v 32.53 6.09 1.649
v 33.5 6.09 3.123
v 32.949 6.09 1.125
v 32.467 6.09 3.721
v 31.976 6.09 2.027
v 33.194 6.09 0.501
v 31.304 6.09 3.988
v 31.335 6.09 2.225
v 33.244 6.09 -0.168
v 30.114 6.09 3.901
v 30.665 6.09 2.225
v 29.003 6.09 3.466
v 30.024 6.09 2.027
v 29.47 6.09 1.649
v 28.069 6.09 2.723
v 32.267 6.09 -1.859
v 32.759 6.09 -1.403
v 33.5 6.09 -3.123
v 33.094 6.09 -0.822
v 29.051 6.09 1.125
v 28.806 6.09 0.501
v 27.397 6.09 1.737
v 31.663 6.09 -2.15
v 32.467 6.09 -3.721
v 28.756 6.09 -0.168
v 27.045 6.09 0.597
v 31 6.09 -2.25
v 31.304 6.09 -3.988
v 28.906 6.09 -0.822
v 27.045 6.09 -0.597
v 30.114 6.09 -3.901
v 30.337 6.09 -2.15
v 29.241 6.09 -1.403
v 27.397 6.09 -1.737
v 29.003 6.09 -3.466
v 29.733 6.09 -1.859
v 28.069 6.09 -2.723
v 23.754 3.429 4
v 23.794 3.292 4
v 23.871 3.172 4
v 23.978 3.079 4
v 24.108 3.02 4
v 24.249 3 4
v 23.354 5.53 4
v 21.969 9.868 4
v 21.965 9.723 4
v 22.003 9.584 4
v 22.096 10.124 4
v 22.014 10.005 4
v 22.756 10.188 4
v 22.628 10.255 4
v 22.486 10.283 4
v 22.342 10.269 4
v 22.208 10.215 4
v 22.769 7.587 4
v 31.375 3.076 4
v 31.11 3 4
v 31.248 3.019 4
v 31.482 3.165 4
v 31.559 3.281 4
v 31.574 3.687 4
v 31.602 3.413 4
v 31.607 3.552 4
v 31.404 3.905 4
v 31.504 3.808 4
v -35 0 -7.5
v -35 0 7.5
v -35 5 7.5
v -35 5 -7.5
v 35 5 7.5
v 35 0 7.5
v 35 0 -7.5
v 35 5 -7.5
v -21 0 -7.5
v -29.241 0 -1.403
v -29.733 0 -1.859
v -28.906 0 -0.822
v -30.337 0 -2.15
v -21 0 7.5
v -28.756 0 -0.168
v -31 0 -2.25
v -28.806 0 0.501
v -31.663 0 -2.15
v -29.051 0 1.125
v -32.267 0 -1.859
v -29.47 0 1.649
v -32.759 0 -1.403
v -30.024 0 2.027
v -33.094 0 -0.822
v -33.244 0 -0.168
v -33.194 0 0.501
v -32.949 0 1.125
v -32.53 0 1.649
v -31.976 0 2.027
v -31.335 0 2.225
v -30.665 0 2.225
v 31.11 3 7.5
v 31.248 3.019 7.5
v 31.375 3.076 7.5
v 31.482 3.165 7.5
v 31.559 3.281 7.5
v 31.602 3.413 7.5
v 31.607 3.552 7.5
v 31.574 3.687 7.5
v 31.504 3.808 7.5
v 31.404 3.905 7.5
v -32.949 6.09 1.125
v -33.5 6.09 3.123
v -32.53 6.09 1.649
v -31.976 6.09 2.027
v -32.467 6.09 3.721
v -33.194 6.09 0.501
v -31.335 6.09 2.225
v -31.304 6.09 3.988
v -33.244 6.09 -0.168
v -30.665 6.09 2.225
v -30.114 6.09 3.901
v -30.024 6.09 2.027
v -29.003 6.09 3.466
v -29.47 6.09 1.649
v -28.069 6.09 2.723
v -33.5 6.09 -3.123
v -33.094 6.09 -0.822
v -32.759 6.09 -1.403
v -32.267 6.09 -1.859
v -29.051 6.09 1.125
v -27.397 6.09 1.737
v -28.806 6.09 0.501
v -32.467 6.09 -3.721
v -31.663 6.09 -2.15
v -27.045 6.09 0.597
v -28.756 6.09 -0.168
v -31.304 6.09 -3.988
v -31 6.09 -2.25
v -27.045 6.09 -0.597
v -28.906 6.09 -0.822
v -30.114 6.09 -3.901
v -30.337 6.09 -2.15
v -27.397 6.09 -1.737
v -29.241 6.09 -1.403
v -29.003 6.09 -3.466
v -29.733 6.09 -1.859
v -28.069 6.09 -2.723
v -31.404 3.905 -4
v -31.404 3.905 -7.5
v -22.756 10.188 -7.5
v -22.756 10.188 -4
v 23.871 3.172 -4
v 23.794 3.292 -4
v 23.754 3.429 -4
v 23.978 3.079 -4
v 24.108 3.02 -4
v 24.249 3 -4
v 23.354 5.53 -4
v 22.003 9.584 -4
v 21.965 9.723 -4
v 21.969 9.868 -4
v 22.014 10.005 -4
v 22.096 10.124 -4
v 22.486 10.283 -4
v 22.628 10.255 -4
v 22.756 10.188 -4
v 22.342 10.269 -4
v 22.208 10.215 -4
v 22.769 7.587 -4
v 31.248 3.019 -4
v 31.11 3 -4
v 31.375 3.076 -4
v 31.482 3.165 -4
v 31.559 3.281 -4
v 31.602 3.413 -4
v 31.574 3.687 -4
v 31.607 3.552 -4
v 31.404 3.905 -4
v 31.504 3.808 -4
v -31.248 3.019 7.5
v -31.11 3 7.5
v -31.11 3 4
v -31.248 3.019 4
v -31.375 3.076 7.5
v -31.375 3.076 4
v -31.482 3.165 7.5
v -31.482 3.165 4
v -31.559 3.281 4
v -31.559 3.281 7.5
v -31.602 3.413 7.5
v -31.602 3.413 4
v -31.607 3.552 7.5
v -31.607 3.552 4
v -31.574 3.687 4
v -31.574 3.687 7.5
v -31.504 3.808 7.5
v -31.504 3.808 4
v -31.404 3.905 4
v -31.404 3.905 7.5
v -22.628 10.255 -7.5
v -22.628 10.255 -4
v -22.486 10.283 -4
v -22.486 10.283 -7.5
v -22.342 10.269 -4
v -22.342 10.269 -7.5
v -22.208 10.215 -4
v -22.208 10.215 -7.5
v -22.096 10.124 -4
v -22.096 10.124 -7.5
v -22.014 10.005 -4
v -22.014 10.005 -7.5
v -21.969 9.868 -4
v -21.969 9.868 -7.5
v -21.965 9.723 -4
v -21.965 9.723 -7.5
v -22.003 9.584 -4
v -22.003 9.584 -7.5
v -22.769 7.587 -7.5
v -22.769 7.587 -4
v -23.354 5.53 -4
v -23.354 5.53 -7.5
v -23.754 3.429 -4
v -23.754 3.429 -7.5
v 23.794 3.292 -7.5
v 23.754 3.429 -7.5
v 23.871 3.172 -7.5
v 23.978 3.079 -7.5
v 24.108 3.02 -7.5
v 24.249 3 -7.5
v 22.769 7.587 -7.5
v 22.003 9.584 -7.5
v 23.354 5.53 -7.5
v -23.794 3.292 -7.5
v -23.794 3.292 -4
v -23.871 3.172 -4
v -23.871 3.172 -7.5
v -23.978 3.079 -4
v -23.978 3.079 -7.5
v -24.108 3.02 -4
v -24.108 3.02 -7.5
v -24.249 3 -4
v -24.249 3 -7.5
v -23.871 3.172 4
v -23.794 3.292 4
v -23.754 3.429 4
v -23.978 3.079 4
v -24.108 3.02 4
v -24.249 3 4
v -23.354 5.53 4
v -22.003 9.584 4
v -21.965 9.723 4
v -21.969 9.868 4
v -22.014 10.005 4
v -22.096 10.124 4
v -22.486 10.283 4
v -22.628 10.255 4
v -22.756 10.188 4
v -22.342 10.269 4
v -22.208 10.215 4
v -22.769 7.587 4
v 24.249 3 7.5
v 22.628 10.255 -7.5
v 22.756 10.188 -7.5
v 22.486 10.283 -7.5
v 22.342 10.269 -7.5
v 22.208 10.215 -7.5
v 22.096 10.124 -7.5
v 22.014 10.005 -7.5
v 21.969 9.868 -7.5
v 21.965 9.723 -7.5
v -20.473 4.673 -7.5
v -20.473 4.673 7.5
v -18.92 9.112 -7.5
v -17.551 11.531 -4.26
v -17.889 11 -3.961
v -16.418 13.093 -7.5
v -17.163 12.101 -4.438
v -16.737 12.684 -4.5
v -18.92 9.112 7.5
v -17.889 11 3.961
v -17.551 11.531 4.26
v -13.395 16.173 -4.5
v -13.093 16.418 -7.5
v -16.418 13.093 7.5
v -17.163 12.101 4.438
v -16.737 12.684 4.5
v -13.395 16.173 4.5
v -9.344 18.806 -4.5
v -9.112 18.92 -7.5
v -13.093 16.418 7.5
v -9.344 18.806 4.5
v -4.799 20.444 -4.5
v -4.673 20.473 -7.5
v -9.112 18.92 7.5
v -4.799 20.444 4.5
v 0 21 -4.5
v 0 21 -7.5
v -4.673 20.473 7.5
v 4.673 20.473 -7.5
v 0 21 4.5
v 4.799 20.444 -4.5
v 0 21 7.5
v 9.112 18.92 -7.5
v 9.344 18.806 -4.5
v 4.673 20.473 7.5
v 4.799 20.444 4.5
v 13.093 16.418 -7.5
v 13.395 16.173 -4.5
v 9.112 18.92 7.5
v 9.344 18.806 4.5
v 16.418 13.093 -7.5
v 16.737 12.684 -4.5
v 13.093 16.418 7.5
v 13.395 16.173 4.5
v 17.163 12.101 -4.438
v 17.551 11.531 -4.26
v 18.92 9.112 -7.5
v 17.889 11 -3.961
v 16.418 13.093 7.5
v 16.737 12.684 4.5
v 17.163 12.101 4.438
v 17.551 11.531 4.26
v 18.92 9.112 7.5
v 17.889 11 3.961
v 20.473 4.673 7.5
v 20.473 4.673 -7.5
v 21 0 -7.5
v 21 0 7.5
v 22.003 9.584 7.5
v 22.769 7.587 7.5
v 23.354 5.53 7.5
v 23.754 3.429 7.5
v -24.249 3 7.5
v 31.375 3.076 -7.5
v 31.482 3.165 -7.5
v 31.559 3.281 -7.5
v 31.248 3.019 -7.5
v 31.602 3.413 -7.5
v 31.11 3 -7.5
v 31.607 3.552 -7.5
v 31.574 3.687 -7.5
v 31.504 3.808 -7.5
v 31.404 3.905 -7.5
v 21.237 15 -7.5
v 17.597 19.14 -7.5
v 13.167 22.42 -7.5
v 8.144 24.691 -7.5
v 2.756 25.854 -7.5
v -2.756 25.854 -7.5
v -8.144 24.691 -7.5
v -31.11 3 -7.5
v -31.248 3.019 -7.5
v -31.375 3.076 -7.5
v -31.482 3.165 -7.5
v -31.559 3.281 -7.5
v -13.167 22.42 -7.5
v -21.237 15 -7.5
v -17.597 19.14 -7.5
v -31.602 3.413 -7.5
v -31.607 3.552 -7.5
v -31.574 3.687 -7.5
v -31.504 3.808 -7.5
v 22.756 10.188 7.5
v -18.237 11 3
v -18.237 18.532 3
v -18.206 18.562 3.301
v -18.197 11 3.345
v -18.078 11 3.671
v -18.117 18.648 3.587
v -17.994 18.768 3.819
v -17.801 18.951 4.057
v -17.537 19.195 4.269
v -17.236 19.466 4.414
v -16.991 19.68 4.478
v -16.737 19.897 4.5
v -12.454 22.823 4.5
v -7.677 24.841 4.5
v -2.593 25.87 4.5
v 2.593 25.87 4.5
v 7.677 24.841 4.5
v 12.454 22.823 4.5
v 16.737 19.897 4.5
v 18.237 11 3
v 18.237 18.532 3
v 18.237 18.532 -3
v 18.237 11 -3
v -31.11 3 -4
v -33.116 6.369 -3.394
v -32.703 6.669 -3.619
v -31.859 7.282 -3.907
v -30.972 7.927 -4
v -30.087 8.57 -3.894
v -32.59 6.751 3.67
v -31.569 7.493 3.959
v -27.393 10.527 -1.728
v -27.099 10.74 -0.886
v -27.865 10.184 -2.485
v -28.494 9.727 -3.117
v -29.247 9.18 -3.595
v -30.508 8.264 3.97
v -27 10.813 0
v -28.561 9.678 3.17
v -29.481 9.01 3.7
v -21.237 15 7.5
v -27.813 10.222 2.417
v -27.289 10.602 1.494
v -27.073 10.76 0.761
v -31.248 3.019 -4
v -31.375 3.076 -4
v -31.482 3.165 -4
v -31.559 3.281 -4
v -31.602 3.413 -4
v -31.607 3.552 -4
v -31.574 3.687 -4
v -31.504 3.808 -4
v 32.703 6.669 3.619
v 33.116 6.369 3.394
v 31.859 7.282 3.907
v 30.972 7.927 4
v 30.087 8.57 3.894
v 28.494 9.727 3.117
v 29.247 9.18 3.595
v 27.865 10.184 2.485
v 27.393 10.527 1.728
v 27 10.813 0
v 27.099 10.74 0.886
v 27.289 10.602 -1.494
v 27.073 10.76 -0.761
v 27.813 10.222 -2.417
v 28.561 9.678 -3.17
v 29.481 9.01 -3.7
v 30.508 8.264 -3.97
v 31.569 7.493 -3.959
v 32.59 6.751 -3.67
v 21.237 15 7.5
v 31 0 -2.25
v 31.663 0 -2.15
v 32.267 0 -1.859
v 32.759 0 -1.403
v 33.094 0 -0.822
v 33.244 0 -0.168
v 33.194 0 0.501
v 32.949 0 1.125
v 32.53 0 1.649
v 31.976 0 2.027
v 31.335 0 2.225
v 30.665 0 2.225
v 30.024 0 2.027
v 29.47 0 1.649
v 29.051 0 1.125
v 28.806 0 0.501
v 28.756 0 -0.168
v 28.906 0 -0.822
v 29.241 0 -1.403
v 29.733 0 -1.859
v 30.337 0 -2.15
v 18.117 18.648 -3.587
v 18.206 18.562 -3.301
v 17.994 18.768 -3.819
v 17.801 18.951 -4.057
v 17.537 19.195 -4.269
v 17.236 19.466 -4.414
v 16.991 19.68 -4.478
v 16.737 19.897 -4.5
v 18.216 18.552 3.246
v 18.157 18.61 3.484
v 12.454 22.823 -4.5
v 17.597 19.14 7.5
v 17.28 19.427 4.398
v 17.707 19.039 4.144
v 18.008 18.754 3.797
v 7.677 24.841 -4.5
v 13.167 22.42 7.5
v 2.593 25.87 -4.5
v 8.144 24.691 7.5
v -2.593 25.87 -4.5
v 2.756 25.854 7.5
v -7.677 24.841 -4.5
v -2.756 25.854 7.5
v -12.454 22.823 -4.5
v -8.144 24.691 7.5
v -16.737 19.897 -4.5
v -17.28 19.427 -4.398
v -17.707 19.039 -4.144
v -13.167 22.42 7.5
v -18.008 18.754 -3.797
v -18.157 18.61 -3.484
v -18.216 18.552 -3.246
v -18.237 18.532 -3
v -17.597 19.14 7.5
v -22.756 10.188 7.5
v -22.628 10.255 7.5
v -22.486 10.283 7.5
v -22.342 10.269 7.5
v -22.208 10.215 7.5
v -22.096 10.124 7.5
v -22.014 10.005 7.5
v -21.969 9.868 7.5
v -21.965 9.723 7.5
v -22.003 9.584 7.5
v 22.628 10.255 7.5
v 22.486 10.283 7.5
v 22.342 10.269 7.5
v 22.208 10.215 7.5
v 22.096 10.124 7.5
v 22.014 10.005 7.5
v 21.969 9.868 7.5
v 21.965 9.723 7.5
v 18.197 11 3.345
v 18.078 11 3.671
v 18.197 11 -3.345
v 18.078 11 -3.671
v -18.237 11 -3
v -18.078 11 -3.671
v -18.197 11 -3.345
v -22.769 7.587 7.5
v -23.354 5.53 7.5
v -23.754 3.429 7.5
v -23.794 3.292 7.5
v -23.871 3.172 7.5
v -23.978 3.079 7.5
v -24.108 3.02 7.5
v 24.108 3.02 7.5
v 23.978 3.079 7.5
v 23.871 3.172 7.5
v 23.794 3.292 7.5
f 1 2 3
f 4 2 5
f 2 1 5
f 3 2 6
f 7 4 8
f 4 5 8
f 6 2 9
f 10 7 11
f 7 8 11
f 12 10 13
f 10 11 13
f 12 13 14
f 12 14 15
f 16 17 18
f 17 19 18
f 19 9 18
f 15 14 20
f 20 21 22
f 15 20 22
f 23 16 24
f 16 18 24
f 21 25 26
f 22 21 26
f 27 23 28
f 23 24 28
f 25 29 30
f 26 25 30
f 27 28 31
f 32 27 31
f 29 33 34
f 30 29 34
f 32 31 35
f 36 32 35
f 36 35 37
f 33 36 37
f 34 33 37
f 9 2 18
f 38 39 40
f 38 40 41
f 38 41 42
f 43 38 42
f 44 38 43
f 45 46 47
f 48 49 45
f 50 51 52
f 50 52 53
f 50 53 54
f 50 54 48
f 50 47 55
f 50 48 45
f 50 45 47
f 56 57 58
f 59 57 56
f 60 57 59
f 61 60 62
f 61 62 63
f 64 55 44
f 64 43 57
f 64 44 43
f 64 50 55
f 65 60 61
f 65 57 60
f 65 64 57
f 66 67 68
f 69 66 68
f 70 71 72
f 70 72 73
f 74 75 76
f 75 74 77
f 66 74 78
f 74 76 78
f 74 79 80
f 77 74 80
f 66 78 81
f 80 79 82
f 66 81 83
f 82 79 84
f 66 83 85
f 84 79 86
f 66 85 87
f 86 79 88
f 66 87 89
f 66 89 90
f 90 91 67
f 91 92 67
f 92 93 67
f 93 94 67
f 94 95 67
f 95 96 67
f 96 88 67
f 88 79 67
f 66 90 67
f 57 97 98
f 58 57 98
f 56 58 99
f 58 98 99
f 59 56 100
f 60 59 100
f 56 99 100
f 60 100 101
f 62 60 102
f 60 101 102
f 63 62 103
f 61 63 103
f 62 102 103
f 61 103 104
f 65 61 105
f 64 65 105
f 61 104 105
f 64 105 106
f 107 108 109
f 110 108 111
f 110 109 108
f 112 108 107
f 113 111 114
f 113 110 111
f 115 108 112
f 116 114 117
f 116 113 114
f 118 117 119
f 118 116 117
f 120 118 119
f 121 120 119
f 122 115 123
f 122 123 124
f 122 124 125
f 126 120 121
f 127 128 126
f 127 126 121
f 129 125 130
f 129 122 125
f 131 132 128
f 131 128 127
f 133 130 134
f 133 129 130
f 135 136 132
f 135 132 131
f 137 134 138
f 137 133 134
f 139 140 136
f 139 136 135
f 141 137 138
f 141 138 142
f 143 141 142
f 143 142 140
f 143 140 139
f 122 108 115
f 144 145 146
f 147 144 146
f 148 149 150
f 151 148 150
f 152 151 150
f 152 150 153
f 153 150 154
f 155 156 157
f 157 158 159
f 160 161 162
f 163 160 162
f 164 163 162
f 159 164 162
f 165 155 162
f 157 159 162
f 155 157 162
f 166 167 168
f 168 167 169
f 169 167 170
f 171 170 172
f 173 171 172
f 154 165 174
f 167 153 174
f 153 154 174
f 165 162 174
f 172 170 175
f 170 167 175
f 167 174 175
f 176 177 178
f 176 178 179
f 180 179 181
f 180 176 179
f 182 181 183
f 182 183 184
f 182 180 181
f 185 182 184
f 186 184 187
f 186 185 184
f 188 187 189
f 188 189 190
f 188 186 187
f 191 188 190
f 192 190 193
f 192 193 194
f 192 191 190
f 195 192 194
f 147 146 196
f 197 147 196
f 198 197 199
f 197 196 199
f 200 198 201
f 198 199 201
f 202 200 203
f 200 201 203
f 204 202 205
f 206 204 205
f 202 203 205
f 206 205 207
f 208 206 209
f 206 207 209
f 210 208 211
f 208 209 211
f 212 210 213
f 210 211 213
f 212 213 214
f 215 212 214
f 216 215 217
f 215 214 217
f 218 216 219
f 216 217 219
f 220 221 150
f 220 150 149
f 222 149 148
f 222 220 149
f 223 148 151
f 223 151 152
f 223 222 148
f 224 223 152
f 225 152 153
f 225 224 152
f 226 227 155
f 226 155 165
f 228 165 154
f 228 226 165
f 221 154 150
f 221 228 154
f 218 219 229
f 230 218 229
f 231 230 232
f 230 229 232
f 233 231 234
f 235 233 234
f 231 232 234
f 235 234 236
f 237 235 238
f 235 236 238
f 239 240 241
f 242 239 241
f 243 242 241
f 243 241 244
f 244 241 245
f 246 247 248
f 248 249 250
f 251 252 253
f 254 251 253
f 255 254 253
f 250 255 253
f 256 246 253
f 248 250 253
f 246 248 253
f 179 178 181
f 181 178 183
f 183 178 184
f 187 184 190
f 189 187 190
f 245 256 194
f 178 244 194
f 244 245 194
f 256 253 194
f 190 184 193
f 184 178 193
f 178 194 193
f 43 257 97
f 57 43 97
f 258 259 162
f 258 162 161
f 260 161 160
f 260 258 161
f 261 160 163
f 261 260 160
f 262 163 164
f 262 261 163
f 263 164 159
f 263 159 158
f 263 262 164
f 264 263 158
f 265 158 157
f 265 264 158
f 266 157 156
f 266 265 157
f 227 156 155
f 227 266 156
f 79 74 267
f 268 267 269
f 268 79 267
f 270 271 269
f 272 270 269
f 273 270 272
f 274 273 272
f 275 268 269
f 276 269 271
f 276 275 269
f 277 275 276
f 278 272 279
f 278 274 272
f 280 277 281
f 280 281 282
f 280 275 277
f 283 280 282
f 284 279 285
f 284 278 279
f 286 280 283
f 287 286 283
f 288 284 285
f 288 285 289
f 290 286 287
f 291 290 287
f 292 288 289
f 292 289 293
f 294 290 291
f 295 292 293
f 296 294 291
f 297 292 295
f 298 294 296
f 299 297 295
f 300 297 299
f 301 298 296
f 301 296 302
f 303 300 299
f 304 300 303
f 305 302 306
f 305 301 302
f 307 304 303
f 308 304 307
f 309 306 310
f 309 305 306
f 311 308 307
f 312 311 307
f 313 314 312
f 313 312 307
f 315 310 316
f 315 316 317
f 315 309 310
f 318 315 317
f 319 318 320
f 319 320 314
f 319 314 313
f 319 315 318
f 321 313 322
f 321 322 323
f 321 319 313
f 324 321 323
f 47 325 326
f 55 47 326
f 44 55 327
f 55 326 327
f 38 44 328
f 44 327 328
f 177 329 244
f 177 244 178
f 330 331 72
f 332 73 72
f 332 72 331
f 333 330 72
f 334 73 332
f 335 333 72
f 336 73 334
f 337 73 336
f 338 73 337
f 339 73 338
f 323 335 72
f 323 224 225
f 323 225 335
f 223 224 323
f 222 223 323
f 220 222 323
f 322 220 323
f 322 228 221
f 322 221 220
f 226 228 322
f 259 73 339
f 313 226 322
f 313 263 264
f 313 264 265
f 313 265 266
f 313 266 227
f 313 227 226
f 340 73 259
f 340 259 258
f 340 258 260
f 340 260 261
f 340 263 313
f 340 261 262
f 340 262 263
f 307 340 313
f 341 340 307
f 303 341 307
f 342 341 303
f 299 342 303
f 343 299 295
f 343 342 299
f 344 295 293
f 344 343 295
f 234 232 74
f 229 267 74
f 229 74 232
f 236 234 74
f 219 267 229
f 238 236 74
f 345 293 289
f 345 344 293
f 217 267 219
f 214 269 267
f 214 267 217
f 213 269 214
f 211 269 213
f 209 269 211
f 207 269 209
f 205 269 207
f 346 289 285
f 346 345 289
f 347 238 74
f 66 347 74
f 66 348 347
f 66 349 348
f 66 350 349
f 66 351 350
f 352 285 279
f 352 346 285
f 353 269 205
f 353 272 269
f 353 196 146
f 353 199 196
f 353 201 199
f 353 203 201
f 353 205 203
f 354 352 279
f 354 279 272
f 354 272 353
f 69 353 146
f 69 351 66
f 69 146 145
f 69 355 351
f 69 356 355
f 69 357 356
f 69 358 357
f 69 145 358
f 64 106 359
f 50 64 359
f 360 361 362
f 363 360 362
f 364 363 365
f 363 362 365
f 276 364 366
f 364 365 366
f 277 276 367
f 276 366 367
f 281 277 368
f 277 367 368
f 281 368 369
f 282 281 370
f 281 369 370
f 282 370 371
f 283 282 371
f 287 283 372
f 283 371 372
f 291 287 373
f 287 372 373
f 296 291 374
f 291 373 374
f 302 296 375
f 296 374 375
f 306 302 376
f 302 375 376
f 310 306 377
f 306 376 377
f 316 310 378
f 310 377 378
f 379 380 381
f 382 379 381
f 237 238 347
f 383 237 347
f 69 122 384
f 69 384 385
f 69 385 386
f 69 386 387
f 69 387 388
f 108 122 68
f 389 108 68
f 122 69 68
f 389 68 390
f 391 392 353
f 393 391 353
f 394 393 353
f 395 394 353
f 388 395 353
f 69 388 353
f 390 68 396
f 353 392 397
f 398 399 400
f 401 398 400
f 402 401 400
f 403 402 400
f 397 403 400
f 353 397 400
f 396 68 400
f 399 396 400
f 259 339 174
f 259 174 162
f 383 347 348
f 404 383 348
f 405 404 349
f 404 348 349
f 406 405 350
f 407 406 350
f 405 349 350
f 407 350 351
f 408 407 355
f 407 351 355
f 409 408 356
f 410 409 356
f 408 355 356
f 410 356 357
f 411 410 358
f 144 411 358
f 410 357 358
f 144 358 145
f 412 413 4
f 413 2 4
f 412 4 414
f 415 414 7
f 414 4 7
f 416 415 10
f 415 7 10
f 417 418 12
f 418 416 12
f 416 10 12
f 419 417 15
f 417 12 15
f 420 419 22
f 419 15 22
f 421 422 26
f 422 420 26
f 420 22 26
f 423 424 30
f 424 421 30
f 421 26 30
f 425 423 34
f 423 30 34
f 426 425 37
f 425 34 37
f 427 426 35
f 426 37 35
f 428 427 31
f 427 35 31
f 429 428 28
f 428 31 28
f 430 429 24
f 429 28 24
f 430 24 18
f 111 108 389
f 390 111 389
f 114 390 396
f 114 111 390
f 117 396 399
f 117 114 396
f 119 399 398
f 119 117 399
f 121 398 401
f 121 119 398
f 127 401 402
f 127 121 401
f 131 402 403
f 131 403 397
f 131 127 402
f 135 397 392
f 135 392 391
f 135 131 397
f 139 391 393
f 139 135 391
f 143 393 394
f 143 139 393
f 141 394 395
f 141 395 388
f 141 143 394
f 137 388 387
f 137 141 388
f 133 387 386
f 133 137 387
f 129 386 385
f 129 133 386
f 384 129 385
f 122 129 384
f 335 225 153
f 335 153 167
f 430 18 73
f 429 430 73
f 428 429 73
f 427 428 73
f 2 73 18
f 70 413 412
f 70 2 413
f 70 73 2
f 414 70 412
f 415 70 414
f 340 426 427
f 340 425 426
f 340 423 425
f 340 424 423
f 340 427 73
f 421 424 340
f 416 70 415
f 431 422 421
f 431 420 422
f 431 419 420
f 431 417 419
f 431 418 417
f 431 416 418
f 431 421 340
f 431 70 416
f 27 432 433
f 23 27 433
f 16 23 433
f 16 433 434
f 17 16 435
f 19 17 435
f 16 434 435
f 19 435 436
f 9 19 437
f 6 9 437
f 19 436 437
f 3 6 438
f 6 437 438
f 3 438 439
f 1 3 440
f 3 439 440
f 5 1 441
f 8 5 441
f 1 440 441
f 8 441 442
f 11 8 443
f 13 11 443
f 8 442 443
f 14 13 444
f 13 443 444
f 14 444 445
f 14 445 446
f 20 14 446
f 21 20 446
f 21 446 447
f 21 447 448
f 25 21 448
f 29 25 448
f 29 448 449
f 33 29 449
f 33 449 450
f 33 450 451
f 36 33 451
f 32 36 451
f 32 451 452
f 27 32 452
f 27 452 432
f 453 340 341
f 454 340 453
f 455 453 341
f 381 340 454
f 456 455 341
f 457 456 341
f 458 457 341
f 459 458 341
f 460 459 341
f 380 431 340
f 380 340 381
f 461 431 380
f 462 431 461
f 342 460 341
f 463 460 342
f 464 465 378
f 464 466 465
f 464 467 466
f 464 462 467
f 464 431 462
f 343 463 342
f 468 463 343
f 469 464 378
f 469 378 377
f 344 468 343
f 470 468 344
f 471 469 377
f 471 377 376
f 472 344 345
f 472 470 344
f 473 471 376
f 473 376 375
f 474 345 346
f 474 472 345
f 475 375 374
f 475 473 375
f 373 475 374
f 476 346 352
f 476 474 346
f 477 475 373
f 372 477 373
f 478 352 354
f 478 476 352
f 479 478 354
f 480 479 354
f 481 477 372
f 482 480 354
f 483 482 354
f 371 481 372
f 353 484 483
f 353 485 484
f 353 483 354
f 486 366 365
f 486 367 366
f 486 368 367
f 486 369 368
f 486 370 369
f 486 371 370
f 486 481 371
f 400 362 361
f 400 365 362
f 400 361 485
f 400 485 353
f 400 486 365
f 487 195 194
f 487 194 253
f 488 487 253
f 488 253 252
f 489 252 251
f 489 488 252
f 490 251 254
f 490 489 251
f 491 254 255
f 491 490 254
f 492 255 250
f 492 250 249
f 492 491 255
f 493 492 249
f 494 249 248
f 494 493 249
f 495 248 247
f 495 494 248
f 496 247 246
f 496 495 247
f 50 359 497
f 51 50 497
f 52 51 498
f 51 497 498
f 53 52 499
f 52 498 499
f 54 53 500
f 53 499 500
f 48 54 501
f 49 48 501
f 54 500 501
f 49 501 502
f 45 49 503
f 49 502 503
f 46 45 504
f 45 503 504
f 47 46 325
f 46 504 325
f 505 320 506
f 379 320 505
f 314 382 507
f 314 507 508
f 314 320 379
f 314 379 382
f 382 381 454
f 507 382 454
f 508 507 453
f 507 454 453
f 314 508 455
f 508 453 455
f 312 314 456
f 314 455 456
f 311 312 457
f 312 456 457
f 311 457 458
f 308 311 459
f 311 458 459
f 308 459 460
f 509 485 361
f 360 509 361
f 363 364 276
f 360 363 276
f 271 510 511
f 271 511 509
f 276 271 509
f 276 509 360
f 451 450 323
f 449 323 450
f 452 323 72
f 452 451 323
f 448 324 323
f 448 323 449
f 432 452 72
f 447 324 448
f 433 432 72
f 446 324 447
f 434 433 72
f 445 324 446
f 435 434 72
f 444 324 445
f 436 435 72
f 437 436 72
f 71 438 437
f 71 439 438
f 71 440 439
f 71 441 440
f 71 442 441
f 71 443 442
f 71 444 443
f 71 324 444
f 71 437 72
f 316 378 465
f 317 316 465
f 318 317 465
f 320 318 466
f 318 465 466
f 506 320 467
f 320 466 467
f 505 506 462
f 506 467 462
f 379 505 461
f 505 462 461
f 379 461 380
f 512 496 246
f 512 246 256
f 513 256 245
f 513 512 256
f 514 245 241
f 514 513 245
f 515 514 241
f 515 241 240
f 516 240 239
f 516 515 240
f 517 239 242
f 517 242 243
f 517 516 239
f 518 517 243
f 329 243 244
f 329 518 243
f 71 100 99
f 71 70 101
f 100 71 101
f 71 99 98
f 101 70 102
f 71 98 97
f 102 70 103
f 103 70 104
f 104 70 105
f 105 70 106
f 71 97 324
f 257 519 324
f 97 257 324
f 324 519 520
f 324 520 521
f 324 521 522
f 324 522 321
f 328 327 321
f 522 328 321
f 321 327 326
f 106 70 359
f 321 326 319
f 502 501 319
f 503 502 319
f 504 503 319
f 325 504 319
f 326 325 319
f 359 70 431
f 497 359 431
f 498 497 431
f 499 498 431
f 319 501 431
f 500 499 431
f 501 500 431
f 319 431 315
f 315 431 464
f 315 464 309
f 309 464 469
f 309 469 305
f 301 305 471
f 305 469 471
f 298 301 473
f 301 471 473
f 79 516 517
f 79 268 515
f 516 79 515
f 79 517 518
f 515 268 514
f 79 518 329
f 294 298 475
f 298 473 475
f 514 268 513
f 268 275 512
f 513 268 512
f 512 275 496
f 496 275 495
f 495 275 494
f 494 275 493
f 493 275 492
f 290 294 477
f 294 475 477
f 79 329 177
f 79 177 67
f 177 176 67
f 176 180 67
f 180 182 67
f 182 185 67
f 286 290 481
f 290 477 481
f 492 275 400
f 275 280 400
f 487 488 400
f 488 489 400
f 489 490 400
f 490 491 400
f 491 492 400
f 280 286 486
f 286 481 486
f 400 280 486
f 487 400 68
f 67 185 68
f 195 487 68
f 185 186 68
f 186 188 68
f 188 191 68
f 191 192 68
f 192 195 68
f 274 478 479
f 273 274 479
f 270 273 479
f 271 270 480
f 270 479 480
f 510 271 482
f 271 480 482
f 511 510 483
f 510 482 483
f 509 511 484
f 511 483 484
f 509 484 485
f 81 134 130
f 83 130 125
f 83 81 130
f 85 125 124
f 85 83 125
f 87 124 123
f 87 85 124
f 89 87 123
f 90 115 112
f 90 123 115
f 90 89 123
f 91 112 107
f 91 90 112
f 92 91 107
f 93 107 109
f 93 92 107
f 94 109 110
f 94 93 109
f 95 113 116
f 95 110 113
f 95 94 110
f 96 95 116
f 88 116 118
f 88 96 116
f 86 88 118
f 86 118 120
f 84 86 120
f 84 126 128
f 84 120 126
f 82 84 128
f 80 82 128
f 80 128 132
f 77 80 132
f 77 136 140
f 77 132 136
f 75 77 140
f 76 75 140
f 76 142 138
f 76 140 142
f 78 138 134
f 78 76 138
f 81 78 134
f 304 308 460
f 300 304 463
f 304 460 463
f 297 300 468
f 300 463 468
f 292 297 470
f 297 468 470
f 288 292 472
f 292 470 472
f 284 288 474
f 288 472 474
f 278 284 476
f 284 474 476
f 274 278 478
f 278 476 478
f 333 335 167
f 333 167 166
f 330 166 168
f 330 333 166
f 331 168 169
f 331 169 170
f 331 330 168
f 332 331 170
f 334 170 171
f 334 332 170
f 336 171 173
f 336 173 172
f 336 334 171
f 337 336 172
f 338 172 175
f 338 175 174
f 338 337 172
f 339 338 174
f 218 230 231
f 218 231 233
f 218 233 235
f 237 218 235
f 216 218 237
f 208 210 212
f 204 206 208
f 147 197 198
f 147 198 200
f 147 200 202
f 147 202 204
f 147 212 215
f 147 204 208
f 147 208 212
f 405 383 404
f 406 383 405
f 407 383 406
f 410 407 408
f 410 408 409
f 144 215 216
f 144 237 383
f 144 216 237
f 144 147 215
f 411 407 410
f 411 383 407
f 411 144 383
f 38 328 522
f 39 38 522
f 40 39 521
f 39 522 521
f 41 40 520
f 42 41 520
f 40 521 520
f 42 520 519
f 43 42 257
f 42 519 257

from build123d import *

# Parameters (mm, degrees)
SALIENTE_EXTRUIR1_DEPTH = 7.5
SALIENTE_EXTRUIR2_DEPTH = 7.5
CROQUIS3_R              = 2.25
CORTAR_EXTRUIR1_DEPTH   = 45.240818256
CROQUIS4_R              = 4
CORTAR_EXTRUIR2_DEPTH   = 41.959224846
CORTAR_EXTRUIR3_DEPTH   = 3.5
CORTAR_EXTRUIR4_DEPTH   = 15
SIMETR_A3_COPY_1_DEPTH  = 3.5


with BuildPart() as part:
    # Croquis1 → Saliente-Extruir1 (new, symmetric)
    with BuildSketch(Plane.XY):
        with BuildLine():
            Line((-26, 0), (-21, 0))
            ThreePointArc((-21, 0), (0, 21), (21, 0))
            Line((21, 0), (26, 0))
            ThreePointArc((26, 0), (0, 26), (-26, 0))
        make_face()
    extrude(amount=SALIENTE_EXTRUIR1_DEPTH, both=True)

    # Croquis2 → Saliente-Extruir2 (add, symmetric)
    with BuildSketch(Plane.XY):
        with BuildLine():
            Line((26, 0), (35, 0))
            Line((35, 0), (35, 5))
            Line((35, 5), (21.236760582, 15))
            ThreePointArc((21.236760582, 15), (24.78059498, 7.869060455), (26, 0))
        make_face()
    saliente_extruir2 = extrude(amount=SALIENTE_EXTRUIR2_DEPTH, both=True)

    # Croquis3 → Cortar-Extruir1 (cut, through all)
    with BuildSketch(Plane.XZ):
        with Locations(Location((31, 0, 0), (0, 0, 270))):
            Circle(CROQUIS3_R)
    cortar_extruir1 = extrude(amount=-CORTAR_EXTRUIR1_DEPTH, mode=Mode.SUBTRACT)

    # Croquis4 → Cortar-Extruir2 (cut, through all)
    with BuildSketch(Plane(origin=(0, 6.09, 0), x_dir=(-1, 0, 0), z_dir=(0, -1, 0))):
        with Locations((-31, 0)):
            Circle(CROQUIS4_R)
    cortar_extruir2 = extrude(amount=-CORTAR_EXTRUIR2_DEPTH, mode=Mode.SUBTRACT)

    # Simetría1: Saliente-Extruir2, Cortar-Extruir1, Cortar-Extruir2 across plane
    add(saliente_extruir2.mirror(Plane(origin=(0, 0, 0), x_dir=(0, 0, 1), z_dir=(1, 0, 0))))
    add(cortar_extruir1.mirror(Plane(origin=(0, 0, 0), x_dir=(0, 0, 1), z_dir=(1, 0, 0))), mode=Mode.SUBTRACT)
    add(cortar_extruir2.mirror(Plane(origin=(0, 0, 0), x_dir=(0, 0, 1), z_dir=(1, 0, 0))), mode=Mode.SUBTRACT)

    # Croquis6 → Cortar-Extruir3 (cut)
    with BuildSketch(Plane.XY.offset(7.5)):
        with BuildLine():
            Line((31.403995152, 3.90450261), (22.755647062, 10.188159987))
            ThreePointArc((22.755647062, 10.188159987), (22.148664364, 10.17350309), (22.003343347, 9.5839909))
            ThreePointArc((22.003343347, 9.5839909), (23.084675568, 6.564887959), (23.753839647, 3.428571429))
            ThreePointArc((23.753839647, 3.428571429), (23.921384471, 3.122035527), (24.248711306, 3))
            Line((24.248711306, 3), (31.110094423, 3))
            ThreePointArc((31.110094423, 3), (31.585621134, 3.34548674), (31.403995152, 3.90450261))
        make_face()
    cortar_extruir3 = extrude(amount=-CORTAR_EXTRUIR3_DEPTH, mode=Mode.SUBTRACT)

    # Simetría2: Cortar-Extruir3 across plane
    add(cortar_extruir3.mirror(Plane.XY), mode=Mode.SUBTRACT)

    # Croquis8 → Cortar-Extruir4 (cut)
    with BuildSketch(Plane(origin=(0, 26, 0), x_dir=(1, 0, 0), z_dir=(0, 1, 0))):
        with BuildLine():
            Line((-16.736760582, -4.5), (16.736760582, -4.5))
            ThreePointArc((16.736760582, -4.5), (17.797420753, -4.060660172), (18.236760582, -3))
            Line((18.236760582, -3), (18.236760582, 3))
            ThreePointArc((18.236760582, 3), (17.797420753, 4.060660172), (16.736760582, 4.5))
            Line((16.736760582, 4.5), (-16.736760582, 4.5))
            ThreePointArc((-16.736760582, 4.5), (-17.797420753, 4.060660172), (-18.236760582, 3))
            Line((-18.236760582, 3), (-18.236760582, -3))
            ThreePointArc((-18.236760582, -3), (-17.797420753, -4.060660172), (-16.736760582, -4.5))
        make_face()
    extrude(amount=-CORTAR_EXTRUIR4_DEPTH, mode=Mode.SUBTRACT)

    # Simetría3: Cortar-Extruir3 across plane
    add(cortar_extruir3.mirror(Plane(origin=(0, 0, 0), x_dir=(0, 0, 1), z_dir=(1, 0, 0))), mode=Mode.SUBTRACT)

    # Simetría3 copy 1 sketch → Simetría3 copy 1 (cut)
    with BuildSketch(Plane(origin=(0, 0, -7.5), x_dir=(-1, 0, 0), z_dir=(0, 0, -1))):
        with BuildLine():
            Line((31.403995152, 3.90450261), (22.755647062, 10.188159987))
            ThreePointArc((22.755647062, 10.188159987), (22.148664364, 10.17350309), (22.003343347, 9.5839909))
            ThreePointArc((22.003343347, 9.5839909), (23.084675568, 6.564887959), (23.753839647, 3.428571429))
            ThreePointArc((23.753839647, 3.428571429), (23.921384471, 3.122035527), (24.248711306, 3))
            Line((24.248711306, 3), (31.110094423, 3))
            ThreePointArc((31.110094423, 3), (31.585621134, 3.34548674), (31.403995152, 3.90450261))
        make_face()
    extrude(amount=-SIMETR_A3_COPY_1_DEPTH, mode=Mode.SUBTRACT)


solid = part.part
